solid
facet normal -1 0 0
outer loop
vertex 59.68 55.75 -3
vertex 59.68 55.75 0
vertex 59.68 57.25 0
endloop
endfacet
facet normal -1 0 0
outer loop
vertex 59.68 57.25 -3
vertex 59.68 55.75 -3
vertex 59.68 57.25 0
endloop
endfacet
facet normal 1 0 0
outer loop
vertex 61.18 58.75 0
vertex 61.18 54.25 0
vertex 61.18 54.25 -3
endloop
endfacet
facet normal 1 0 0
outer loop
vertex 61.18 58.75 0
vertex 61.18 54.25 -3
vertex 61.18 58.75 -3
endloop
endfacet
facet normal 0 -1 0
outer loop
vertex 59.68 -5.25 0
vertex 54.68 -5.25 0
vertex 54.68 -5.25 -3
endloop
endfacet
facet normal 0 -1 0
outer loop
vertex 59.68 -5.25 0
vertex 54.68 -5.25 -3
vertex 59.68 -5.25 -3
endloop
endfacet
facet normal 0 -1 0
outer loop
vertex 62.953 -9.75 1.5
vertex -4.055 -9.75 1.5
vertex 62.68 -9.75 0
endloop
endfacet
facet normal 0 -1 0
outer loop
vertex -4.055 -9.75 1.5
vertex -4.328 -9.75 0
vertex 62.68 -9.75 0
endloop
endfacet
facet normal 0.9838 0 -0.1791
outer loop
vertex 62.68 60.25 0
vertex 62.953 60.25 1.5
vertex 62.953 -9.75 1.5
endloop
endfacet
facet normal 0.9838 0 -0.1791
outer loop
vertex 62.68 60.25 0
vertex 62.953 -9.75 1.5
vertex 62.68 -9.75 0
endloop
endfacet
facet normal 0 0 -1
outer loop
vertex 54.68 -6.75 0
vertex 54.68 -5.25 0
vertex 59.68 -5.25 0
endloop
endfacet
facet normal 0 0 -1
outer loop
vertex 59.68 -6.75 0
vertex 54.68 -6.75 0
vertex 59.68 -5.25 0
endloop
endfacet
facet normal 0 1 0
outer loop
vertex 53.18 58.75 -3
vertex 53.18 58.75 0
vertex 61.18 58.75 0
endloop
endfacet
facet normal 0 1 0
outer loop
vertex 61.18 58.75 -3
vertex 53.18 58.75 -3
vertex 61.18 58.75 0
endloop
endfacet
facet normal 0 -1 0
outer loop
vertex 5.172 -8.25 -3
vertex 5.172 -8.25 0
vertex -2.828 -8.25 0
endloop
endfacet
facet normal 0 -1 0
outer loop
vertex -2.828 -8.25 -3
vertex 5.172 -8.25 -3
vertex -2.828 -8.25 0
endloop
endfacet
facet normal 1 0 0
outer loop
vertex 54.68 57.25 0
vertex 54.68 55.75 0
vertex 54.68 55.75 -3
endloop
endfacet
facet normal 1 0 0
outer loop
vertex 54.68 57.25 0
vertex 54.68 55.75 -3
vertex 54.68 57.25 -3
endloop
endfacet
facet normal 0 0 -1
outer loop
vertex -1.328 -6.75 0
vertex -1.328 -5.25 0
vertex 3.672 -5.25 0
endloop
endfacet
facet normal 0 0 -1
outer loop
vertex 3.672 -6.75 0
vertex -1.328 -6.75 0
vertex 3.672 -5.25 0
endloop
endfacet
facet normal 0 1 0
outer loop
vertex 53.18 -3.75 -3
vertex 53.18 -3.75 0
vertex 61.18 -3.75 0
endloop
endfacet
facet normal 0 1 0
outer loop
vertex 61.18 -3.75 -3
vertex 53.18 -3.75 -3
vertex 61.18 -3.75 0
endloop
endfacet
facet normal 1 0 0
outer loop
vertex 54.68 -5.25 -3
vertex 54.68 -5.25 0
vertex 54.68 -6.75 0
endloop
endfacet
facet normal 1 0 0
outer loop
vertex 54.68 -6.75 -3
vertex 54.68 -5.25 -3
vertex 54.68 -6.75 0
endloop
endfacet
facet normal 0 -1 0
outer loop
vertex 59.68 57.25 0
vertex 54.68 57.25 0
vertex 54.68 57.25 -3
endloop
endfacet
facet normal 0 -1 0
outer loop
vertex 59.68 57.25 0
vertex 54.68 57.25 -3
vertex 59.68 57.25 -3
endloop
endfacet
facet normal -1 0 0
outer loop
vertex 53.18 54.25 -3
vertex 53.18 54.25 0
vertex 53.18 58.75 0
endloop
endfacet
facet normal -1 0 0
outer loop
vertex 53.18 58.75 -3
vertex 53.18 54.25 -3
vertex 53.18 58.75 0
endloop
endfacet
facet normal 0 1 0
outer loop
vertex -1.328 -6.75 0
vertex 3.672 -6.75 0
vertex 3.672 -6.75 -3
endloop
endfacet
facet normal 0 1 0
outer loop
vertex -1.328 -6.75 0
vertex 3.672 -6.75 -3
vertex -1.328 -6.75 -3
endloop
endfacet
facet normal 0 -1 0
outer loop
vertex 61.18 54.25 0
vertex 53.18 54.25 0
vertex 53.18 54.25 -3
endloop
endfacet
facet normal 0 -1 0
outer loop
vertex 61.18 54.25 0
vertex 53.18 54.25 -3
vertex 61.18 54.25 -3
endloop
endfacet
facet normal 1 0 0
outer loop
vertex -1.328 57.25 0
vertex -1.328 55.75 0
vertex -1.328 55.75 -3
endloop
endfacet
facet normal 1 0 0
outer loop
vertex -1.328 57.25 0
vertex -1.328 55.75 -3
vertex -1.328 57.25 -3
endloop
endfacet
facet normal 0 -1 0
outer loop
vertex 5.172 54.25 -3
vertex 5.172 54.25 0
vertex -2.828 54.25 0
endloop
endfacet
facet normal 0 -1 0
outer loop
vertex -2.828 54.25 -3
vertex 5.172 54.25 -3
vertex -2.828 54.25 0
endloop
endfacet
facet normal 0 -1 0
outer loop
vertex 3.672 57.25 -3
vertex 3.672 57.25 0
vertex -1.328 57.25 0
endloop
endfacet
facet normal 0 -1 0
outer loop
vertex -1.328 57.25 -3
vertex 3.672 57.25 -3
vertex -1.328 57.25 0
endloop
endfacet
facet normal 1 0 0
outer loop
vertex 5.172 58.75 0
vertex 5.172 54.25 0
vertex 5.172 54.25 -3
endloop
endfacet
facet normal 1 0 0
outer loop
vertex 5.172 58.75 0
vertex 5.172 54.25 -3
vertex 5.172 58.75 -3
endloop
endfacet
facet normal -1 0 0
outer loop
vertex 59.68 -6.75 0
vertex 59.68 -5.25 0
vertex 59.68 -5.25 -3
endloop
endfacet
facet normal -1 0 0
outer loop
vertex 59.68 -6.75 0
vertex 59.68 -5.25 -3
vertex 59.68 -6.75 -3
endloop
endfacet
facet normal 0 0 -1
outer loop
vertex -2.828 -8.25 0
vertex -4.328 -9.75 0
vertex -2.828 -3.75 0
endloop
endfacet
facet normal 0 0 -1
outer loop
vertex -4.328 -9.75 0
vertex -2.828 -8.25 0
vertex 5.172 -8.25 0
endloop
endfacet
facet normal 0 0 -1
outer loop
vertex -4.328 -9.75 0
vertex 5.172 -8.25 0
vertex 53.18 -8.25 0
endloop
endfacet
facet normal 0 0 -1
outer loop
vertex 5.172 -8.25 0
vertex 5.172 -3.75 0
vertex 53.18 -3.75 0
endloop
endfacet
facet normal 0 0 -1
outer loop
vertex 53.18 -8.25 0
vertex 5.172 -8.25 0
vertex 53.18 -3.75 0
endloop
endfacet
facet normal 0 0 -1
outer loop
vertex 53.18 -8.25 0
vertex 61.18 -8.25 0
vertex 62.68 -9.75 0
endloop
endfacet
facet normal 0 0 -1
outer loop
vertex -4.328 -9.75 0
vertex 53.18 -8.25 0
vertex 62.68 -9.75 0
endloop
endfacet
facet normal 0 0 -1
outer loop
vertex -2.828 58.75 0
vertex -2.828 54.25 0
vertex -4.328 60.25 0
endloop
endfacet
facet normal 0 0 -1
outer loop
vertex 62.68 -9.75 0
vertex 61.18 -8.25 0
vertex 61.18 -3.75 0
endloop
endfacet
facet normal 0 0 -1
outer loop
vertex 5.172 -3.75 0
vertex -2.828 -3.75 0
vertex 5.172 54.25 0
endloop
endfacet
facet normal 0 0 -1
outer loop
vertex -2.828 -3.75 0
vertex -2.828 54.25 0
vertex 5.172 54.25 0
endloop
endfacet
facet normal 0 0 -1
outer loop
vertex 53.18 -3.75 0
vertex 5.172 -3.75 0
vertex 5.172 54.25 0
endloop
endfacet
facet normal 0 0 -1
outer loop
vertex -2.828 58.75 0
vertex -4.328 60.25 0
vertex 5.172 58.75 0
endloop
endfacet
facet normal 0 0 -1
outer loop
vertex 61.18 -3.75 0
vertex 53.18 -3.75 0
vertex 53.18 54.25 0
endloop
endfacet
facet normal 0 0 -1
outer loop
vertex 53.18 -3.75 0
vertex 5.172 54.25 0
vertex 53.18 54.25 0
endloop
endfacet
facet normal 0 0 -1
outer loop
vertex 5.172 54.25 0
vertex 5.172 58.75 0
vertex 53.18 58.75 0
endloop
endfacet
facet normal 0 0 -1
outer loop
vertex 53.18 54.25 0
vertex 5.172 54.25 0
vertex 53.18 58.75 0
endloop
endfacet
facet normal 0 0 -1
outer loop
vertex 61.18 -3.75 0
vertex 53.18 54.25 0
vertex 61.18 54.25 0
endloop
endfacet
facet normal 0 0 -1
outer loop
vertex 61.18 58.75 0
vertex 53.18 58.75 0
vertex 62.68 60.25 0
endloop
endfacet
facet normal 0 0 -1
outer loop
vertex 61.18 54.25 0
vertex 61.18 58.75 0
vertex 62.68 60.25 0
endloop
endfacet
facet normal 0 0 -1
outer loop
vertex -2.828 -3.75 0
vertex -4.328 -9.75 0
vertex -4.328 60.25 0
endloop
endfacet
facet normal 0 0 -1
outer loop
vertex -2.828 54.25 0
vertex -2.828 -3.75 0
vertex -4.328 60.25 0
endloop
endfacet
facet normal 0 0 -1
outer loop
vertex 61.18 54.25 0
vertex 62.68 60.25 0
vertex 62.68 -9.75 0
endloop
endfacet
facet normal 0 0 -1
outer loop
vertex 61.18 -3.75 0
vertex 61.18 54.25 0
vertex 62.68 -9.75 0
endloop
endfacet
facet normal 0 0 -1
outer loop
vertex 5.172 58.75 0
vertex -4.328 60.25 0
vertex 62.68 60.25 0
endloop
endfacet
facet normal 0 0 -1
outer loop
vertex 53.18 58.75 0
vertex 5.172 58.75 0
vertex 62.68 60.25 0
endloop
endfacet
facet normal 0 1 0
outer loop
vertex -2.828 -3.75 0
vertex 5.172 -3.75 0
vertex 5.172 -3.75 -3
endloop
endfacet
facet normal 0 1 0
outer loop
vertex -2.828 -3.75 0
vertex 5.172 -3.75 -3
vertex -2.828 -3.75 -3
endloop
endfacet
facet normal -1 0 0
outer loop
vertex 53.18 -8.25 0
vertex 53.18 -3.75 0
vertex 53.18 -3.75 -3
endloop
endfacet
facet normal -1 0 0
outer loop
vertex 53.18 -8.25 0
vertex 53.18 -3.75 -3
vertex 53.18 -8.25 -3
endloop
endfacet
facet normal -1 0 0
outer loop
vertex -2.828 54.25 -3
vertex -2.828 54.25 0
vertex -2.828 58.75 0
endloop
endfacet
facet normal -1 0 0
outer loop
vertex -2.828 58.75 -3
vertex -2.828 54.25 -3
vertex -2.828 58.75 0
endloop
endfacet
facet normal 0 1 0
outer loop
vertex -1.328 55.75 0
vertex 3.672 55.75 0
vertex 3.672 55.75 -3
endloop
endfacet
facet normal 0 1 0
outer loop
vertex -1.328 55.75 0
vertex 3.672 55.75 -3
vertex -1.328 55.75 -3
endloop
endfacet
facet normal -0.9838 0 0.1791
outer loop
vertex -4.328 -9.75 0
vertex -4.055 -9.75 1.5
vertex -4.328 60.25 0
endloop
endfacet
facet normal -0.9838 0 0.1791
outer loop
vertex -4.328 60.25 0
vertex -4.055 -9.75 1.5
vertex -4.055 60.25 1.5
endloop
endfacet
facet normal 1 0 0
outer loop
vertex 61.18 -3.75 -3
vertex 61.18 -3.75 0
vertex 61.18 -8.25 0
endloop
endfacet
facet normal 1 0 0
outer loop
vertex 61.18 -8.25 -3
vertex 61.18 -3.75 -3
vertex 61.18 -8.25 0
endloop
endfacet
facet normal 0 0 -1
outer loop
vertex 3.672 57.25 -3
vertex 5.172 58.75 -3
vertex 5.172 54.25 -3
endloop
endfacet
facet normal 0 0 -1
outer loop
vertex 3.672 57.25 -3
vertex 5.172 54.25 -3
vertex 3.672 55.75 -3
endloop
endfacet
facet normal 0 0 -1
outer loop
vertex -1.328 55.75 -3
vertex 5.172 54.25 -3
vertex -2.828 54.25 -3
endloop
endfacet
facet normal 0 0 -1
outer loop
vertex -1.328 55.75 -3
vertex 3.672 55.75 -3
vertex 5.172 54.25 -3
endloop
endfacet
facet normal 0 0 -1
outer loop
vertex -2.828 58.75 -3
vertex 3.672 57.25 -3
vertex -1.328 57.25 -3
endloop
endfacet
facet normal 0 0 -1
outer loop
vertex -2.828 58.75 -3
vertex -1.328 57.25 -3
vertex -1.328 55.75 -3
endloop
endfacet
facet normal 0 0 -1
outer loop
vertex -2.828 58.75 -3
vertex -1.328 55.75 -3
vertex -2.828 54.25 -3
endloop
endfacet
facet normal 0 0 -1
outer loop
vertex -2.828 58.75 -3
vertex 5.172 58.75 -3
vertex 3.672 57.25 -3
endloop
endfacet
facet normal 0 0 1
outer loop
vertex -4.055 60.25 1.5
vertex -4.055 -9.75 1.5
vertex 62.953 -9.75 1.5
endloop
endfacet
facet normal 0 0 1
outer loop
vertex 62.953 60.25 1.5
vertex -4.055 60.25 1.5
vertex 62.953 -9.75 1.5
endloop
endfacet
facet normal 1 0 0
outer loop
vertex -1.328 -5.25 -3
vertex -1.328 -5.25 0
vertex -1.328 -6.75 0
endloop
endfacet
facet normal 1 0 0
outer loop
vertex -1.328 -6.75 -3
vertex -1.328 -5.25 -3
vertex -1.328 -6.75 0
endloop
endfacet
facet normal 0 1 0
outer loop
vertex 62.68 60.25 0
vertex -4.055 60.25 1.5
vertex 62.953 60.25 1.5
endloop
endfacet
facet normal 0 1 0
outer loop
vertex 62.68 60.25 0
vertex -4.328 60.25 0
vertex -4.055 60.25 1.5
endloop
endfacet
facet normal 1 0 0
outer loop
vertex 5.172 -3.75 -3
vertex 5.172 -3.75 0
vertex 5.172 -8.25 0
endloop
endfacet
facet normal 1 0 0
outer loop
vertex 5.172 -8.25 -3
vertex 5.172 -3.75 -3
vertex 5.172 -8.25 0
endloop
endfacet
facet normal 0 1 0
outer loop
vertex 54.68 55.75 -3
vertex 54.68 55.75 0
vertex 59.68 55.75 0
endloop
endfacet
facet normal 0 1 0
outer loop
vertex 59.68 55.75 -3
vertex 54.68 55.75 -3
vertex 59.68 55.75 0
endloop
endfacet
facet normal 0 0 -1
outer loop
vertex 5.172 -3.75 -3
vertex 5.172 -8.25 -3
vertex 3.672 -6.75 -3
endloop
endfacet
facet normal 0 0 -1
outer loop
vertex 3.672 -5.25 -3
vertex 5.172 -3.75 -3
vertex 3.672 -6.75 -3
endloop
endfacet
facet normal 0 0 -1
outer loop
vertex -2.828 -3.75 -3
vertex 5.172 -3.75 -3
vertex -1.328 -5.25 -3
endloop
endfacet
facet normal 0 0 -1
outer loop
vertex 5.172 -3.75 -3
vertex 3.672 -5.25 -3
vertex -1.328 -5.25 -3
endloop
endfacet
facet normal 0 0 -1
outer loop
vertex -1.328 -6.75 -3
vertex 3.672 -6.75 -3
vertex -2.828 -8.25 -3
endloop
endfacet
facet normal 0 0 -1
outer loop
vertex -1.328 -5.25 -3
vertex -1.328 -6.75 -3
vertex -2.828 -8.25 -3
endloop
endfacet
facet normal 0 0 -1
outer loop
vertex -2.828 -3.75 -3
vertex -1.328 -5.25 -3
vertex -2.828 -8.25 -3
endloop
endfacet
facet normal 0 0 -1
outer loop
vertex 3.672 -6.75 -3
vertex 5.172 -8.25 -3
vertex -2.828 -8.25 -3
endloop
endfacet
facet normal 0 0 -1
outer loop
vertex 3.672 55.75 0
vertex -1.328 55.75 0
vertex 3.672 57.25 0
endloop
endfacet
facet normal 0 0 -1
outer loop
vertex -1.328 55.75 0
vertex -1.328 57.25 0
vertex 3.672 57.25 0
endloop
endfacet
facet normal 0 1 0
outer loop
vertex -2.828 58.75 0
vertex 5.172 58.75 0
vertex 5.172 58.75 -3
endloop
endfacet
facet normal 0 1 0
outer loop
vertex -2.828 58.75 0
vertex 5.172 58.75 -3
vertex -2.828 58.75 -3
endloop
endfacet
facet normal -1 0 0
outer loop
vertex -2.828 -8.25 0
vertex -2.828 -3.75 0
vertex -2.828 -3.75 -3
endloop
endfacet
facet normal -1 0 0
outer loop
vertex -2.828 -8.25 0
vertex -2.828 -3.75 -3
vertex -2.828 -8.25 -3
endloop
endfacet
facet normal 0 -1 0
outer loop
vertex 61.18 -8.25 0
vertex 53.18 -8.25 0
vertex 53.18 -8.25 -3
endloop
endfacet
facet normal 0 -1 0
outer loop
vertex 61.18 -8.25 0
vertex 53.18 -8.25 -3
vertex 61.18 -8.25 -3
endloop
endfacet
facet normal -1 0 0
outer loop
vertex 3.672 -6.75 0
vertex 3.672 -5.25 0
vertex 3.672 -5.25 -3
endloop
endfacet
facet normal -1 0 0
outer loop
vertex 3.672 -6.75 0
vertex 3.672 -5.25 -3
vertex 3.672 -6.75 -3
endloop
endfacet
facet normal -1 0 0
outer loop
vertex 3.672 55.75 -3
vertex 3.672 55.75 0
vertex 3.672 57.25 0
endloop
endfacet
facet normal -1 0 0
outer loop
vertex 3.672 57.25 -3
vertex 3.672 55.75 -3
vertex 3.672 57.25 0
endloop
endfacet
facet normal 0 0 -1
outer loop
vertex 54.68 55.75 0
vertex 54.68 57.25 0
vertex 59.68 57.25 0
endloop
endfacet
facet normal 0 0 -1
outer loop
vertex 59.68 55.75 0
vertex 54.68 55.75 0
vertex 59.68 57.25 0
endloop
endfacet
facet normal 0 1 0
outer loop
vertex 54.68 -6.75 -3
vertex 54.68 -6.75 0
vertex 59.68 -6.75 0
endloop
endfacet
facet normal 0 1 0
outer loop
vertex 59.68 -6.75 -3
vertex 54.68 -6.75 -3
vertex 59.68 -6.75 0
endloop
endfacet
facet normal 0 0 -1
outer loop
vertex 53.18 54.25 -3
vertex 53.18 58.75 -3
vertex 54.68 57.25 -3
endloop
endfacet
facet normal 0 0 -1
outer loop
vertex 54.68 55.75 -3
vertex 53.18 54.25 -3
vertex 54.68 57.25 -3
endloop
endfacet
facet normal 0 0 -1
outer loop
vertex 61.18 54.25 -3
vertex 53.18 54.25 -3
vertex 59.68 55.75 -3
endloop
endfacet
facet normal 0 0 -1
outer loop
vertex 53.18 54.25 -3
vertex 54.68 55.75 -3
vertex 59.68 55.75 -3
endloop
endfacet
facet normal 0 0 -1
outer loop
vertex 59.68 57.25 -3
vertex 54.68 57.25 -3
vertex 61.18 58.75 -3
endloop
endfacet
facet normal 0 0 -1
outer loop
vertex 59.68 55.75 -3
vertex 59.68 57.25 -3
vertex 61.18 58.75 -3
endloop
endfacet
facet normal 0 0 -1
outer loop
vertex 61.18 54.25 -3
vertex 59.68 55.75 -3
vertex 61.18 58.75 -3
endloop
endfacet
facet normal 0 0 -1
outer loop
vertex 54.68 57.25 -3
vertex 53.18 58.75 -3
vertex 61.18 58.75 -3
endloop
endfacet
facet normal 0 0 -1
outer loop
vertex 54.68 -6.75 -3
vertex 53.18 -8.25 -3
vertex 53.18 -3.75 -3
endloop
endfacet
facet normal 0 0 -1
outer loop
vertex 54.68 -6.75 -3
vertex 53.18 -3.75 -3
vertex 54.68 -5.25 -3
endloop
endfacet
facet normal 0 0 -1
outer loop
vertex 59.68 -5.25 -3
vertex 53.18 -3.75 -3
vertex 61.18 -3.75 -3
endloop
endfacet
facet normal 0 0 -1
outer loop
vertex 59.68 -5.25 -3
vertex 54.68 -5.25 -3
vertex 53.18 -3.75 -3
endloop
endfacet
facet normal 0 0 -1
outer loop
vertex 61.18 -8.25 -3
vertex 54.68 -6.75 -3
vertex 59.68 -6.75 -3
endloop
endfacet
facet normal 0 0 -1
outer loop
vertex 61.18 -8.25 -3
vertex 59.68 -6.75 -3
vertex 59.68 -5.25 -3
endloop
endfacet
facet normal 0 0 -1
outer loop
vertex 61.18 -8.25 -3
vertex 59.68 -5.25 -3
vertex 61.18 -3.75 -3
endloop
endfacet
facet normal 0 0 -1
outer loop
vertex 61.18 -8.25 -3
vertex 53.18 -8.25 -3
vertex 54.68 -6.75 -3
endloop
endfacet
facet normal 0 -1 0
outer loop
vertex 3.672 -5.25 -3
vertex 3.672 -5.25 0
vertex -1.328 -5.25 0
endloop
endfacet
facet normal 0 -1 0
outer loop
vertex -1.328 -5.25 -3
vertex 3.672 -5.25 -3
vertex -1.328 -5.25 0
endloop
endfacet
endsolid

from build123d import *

# Parameters (mm, degrees)
SKETCH1_W                 = 67.008250425
SKETCH1_H                 = 70
BOSS_EXTRUDE1_DEPTH       = 1.5
BOSS_EXTRUDE2_START       = -9.75
BOSS_EXTRUDE2_DEPTH       = 70
CUT_EXTRUDE1_START        = -6
CUT_EXTRUDE1_OUTLINE_W    = 73
CUT_EXTRUDE1_OUTLINE_H    = 4
CUT_EXTRUDE1_DEPTH        = 1.741494861
SKETCH4_W                 = 8
SKETCH4_H                 = 4.5
SKETCH4_W_2               = 5
SKETCH4_H_2               = 1.5
BOSS_EXTRUDE3_DEPTH       = 3
MIRROR2_COPY_1_SKETCH_W   = 8
MIRROR2_COPY_1_SKETCH_H   = 4.5
MIRROR2_COPY_1_SKETCH_W_2 = 5
MIRROR2_COPY_1_SKETCH_H_2 = 1.5
MIRROR2_COPY_1_DEPTH      = 3


with BuildPart() as part:
    # Sketch1 → Boss-Extrude1 (new body)
    with BuildSketch(Plane.XY):
        with Locations((29.175646202, 25.25)):
            Rectangle(SKETCH1_W, SKETCH1_H)
    extrude(amount=BOSS_EXTRUDE1_DEPTH)

    # Boss-Extrude2: read off the stored shape, not the designer's step
    # Boss-Extrude2 outline → Boss-Extrude2 (add)
    with BuildSketch(Plane(origin=(0, 0, 0), x_dir=(1, 0, 0), z_dir=(0, 1, 0)).offset(BOSS_EXTRUDE2_START)):
        Polygon((62.952808957, -1.5), (62.679771414, 0), (62.679771414, -1.5), align=None)
    extrude(amount=BOSS_EXTRUDE2_DEPTH)

    # Cut-Extrude1: read off the stored shape, not the designer's step
    # Cut-Extrude1 outline → Cut-Extrude1 (cut)
    with BuildSketch(Plane(origin=(0, 0, 0), x_dir=(0, 1, 0), z_dir=(0.9838340738940914, 0, -0.17908242528220206)).offset(CUT_EXTRUDE1_START)):
        with Locations((25.5, 0)):
            Rectangle(CUT_EXTRUDE1_OUTLINE_W, CUT_EXTRUDE1_OUTLINE_H)
    extrude(amount=CUT_EXTRUDE1_DEPTH, mode=Mode.SUBTRACT)

    # Sketch4 → Boss-Extrude3 (add)
    with BuildSketch(Plane(origin=(0, 0, 0), x_dir=(-1, 0, 0), z_dir=(0, 0, -1))):
        with Locations((-1.171520989, 56.5)):
            Rectangle(SKETCH4_W, SKETCH4_H)
        with Locations((-1.171520989, 56.5)):
            Rectangle(SKETCH4_W_2, SKETCH4_H_2, mode=Mode.SUBTRACT)
    boss_extrude3 = extrude(amount=BOSS_EXTRUDE3_DEPTH)

    # Mirror1: Boss-Extrude3 across plane
    add(boss_extrude3.mirror(Plane(origin=(29.175646202, 0, 0), x_dir=(0, 0, 1), z_dir=(1, 0, 0))))

    # Mirror2: Boss-Extrude3 across plane
    add(boss_extrude3.mirror(Plane(origin=(0, 25.25, 0), x_dir=(0, 0, 1), z_dir=(0, -1, 0))))

    # Mirror2 copy 1 sketch → Mirror2 copy 1 (add)
    with BuildSketch(Plane(origin=(58.351292403, 50.5, 0), x_dir=(1, 0, 0), z_dir=(0, 0, -1))):
        with Locations((-1.171520989, 56.5)):
            Rectangle(MIRROR2_COPY_1_SKETCH_W, MIRROR2_COPY_1_SKETCH_H)
        with Locations((-1.171520989, 56.5)):
            Rectangle(MIRROR2_COPY_1_SKETCH_W_2, MIRROR2_COPY_1_SKETCH_H_2, mode=Mode.SUBTRACT)
    extrude(amount=MIRROR2_COPY_1_DEPTH)


solid = part.part
